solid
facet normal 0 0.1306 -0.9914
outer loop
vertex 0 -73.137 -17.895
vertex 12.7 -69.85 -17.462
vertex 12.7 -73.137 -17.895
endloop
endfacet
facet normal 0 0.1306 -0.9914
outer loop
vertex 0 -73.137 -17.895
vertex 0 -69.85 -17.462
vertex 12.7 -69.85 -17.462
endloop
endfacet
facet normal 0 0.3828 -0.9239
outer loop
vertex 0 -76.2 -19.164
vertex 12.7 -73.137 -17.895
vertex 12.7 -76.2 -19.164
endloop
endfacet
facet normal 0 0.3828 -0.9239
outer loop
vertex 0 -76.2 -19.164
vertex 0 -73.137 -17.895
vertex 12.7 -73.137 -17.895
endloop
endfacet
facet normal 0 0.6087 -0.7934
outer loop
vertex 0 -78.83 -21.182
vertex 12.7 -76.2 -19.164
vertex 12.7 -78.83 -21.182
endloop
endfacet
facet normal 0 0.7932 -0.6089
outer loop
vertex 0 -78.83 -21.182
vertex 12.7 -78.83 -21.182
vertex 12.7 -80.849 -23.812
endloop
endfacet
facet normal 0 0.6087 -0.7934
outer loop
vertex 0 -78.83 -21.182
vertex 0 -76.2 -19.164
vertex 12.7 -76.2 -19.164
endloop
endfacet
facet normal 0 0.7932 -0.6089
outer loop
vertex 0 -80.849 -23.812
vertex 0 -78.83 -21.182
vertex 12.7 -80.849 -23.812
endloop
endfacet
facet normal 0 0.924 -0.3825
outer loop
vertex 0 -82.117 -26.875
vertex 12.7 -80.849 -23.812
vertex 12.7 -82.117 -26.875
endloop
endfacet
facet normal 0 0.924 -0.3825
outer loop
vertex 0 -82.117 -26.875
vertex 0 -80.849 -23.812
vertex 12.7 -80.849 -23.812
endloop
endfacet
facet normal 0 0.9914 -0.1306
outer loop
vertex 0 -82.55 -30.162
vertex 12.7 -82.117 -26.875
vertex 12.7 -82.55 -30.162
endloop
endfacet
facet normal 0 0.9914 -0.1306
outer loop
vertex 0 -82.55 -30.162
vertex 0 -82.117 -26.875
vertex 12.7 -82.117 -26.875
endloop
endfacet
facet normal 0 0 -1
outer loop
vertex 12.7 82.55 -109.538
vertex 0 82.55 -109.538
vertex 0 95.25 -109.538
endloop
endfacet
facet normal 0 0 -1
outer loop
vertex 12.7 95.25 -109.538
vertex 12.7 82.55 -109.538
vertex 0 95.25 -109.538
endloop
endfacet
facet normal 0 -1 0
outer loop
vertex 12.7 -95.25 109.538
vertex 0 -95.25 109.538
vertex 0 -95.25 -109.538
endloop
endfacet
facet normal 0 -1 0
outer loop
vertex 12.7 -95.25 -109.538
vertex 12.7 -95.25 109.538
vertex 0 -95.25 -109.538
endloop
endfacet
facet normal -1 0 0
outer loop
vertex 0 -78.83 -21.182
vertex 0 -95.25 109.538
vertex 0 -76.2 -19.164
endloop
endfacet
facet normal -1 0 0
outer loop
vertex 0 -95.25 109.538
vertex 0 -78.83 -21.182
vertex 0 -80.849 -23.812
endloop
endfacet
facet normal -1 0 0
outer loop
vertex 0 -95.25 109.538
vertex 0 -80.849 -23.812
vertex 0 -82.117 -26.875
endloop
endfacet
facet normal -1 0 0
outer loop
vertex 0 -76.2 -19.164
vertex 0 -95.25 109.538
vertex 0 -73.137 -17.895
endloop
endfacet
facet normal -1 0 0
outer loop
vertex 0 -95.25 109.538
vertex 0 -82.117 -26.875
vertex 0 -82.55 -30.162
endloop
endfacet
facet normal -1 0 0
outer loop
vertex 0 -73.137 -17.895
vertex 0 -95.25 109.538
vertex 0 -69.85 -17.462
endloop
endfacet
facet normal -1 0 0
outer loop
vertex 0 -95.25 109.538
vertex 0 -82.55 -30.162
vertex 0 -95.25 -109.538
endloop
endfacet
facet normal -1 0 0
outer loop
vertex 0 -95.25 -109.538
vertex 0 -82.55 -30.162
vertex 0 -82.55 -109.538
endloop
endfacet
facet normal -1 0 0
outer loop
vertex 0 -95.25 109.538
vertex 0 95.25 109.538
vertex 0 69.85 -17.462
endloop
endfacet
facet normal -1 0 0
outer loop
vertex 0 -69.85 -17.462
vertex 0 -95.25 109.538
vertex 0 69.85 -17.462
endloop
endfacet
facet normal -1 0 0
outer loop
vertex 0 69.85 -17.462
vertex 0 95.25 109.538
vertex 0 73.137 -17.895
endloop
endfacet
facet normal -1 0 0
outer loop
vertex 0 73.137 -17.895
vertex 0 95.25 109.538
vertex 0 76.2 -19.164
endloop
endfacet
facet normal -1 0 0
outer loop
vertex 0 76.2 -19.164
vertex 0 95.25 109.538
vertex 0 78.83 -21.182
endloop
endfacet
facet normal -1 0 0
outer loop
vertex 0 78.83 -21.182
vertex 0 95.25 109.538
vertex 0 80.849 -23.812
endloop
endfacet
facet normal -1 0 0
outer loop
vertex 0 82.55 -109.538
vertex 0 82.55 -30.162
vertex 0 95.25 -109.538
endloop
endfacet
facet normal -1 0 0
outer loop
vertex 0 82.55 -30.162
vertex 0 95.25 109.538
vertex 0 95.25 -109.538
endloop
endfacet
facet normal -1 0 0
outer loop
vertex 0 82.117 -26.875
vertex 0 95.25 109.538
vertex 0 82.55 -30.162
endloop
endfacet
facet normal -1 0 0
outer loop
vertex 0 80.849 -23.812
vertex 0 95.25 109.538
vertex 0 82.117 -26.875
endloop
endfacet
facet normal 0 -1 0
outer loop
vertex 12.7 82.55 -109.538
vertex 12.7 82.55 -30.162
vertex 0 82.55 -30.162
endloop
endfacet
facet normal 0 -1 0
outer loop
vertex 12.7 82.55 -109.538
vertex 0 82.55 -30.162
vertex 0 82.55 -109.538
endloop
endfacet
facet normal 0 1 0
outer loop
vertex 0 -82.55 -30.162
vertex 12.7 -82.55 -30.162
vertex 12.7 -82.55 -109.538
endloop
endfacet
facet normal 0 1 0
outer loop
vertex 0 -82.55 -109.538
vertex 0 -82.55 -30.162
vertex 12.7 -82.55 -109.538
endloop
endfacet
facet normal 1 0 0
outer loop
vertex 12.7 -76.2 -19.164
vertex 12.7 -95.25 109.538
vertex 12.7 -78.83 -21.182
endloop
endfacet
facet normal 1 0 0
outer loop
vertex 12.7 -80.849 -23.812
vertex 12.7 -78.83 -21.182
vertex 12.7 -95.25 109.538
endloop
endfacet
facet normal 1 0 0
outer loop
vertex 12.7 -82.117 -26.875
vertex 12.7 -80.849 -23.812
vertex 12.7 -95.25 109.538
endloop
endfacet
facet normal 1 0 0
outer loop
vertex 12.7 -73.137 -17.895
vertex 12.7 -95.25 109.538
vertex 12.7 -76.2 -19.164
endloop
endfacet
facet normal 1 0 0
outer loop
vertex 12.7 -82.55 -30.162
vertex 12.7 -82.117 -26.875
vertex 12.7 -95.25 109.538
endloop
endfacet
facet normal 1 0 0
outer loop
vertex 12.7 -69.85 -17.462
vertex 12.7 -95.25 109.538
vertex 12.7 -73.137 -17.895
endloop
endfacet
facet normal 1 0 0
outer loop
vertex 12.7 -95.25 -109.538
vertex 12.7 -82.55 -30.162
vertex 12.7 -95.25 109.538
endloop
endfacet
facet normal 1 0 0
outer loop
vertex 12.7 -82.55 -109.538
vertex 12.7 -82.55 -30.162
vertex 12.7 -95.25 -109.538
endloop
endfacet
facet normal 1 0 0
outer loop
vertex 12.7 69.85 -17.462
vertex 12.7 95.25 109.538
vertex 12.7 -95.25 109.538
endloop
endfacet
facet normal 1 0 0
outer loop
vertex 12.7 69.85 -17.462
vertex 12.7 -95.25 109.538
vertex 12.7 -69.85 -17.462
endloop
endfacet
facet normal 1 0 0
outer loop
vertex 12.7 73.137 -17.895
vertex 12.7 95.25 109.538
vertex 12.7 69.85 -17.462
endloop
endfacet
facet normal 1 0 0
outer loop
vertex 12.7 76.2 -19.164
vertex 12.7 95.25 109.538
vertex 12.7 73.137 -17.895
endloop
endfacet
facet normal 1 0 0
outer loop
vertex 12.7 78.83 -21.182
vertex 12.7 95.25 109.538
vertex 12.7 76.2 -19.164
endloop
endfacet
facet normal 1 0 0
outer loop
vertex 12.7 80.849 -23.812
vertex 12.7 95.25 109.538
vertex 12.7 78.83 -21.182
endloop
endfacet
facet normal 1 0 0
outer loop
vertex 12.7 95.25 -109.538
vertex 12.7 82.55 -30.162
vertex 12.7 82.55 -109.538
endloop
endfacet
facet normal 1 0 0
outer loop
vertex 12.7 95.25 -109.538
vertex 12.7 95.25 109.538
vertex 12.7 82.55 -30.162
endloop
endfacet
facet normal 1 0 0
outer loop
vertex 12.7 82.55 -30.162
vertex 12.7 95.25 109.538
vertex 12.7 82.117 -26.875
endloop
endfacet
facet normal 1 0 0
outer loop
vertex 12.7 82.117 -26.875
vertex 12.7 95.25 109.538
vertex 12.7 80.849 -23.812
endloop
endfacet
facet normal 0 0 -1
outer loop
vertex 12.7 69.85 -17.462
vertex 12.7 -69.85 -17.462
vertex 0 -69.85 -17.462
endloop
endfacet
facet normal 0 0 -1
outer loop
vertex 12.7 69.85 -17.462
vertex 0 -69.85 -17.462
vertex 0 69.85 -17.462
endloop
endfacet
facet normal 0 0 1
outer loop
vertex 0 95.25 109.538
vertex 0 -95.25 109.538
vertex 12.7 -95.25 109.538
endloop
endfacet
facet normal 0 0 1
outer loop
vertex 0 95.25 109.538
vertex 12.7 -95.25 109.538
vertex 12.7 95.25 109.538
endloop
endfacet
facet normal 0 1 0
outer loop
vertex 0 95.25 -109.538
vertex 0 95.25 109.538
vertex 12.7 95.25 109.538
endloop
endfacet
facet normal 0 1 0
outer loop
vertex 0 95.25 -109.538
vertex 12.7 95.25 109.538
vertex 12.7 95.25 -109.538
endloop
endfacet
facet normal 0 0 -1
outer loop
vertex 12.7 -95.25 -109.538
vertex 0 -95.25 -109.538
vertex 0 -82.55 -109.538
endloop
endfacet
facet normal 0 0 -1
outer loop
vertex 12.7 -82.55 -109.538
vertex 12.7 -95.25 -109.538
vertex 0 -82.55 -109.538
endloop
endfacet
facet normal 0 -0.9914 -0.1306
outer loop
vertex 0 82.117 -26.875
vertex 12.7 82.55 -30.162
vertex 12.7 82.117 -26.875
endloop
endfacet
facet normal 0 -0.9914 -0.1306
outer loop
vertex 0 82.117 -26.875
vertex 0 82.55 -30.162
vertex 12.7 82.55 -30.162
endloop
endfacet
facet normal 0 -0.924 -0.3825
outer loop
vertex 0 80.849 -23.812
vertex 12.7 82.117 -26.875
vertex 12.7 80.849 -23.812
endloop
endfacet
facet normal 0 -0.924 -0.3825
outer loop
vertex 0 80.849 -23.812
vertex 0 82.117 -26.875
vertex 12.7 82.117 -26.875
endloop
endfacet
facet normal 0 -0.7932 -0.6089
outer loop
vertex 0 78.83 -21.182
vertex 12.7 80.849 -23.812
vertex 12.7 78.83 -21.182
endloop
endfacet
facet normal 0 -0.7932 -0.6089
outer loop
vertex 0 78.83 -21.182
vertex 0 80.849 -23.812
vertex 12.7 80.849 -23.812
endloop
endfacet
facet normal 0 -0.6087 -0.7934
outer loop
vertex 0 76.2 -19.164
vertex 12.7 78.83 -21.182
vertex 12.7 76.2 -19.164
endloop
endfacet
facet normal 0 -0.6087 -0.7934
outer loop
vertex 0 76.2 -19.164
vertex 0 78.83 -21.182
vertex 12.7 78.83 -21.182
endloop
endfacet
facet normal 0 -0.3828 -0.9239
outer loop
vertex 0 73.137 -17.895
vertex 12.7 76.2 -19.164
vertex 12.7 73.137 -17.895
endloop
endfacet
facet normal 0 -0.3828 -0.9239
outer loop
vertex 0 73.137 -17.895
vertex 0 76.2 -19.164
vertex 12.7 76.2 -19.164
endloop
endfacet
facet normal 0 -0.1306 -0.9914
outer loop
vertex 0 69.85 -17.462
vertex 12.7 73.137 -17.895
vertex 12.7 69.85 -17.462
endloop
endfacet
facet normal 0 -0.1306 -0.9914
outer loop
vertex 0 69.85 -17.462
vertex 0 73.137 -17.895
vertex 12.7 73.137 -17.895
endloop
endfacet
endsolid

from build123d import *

# Parameters (mm, degrees)
SKETCH1_W           = 219.075
SKETCH1_H           = 190.5
BOSS_EXTRUDE1_DEPTH = 12.7
CUT_EXTRUDE1_REACH  = 147.713
SKETCH2_W           = 92.075
SKETCH2_H           = 165.1
FILLET1_R           = 12.7


with BuildPart() as part:
    # Sketch1 → Boss-Extrude1 (new body)
    with BuildSketch(Plane(origin=(0, 0, 0), x_dir=(0, 0, -1), z_dir=(1, 0, 0))):
        Rectangle(SKETCH1_W, SKETCH1_H)
    extrude(amount=BOSS_EXTRUDE1_DEPTH)

    # Sketch2 → Cut-Extrude1 (cut, up to next)
    with BuildSketch(Plane(origin=(12.7, 0, 0), x_dir=(0, 0, -1), z_dir=(1, 0, 0)), mode=Mode.PRIVATE) as cut_extrude1_sk1:
        with Locations((63.5, 0)):
            Rectangle(SKETCH2_W, SKETCH2_H)
    cut_extrude1_tool1 = extrude(cut_extrude1_sk1.sketch, amount=-CUT_EXTRUDE1_REACH, mode=Mode.PRIVATE) & part.part
    add(cut_extrude1_tool1.solids().sort_by_distance((12.7, 0, -63.5))[0], mode=Mode.SUBTRACT)

    # Fillet1
    fillet1_edges = [part.edges().sort_by_distance(p)[0] for p in [
        (6.35, -82.55, -17.4625),
        (6.35, 82.55, -17.4625),
    ]]
    fillet(fillet1_edges, radius=FILLET1_R)


solid = part.part
